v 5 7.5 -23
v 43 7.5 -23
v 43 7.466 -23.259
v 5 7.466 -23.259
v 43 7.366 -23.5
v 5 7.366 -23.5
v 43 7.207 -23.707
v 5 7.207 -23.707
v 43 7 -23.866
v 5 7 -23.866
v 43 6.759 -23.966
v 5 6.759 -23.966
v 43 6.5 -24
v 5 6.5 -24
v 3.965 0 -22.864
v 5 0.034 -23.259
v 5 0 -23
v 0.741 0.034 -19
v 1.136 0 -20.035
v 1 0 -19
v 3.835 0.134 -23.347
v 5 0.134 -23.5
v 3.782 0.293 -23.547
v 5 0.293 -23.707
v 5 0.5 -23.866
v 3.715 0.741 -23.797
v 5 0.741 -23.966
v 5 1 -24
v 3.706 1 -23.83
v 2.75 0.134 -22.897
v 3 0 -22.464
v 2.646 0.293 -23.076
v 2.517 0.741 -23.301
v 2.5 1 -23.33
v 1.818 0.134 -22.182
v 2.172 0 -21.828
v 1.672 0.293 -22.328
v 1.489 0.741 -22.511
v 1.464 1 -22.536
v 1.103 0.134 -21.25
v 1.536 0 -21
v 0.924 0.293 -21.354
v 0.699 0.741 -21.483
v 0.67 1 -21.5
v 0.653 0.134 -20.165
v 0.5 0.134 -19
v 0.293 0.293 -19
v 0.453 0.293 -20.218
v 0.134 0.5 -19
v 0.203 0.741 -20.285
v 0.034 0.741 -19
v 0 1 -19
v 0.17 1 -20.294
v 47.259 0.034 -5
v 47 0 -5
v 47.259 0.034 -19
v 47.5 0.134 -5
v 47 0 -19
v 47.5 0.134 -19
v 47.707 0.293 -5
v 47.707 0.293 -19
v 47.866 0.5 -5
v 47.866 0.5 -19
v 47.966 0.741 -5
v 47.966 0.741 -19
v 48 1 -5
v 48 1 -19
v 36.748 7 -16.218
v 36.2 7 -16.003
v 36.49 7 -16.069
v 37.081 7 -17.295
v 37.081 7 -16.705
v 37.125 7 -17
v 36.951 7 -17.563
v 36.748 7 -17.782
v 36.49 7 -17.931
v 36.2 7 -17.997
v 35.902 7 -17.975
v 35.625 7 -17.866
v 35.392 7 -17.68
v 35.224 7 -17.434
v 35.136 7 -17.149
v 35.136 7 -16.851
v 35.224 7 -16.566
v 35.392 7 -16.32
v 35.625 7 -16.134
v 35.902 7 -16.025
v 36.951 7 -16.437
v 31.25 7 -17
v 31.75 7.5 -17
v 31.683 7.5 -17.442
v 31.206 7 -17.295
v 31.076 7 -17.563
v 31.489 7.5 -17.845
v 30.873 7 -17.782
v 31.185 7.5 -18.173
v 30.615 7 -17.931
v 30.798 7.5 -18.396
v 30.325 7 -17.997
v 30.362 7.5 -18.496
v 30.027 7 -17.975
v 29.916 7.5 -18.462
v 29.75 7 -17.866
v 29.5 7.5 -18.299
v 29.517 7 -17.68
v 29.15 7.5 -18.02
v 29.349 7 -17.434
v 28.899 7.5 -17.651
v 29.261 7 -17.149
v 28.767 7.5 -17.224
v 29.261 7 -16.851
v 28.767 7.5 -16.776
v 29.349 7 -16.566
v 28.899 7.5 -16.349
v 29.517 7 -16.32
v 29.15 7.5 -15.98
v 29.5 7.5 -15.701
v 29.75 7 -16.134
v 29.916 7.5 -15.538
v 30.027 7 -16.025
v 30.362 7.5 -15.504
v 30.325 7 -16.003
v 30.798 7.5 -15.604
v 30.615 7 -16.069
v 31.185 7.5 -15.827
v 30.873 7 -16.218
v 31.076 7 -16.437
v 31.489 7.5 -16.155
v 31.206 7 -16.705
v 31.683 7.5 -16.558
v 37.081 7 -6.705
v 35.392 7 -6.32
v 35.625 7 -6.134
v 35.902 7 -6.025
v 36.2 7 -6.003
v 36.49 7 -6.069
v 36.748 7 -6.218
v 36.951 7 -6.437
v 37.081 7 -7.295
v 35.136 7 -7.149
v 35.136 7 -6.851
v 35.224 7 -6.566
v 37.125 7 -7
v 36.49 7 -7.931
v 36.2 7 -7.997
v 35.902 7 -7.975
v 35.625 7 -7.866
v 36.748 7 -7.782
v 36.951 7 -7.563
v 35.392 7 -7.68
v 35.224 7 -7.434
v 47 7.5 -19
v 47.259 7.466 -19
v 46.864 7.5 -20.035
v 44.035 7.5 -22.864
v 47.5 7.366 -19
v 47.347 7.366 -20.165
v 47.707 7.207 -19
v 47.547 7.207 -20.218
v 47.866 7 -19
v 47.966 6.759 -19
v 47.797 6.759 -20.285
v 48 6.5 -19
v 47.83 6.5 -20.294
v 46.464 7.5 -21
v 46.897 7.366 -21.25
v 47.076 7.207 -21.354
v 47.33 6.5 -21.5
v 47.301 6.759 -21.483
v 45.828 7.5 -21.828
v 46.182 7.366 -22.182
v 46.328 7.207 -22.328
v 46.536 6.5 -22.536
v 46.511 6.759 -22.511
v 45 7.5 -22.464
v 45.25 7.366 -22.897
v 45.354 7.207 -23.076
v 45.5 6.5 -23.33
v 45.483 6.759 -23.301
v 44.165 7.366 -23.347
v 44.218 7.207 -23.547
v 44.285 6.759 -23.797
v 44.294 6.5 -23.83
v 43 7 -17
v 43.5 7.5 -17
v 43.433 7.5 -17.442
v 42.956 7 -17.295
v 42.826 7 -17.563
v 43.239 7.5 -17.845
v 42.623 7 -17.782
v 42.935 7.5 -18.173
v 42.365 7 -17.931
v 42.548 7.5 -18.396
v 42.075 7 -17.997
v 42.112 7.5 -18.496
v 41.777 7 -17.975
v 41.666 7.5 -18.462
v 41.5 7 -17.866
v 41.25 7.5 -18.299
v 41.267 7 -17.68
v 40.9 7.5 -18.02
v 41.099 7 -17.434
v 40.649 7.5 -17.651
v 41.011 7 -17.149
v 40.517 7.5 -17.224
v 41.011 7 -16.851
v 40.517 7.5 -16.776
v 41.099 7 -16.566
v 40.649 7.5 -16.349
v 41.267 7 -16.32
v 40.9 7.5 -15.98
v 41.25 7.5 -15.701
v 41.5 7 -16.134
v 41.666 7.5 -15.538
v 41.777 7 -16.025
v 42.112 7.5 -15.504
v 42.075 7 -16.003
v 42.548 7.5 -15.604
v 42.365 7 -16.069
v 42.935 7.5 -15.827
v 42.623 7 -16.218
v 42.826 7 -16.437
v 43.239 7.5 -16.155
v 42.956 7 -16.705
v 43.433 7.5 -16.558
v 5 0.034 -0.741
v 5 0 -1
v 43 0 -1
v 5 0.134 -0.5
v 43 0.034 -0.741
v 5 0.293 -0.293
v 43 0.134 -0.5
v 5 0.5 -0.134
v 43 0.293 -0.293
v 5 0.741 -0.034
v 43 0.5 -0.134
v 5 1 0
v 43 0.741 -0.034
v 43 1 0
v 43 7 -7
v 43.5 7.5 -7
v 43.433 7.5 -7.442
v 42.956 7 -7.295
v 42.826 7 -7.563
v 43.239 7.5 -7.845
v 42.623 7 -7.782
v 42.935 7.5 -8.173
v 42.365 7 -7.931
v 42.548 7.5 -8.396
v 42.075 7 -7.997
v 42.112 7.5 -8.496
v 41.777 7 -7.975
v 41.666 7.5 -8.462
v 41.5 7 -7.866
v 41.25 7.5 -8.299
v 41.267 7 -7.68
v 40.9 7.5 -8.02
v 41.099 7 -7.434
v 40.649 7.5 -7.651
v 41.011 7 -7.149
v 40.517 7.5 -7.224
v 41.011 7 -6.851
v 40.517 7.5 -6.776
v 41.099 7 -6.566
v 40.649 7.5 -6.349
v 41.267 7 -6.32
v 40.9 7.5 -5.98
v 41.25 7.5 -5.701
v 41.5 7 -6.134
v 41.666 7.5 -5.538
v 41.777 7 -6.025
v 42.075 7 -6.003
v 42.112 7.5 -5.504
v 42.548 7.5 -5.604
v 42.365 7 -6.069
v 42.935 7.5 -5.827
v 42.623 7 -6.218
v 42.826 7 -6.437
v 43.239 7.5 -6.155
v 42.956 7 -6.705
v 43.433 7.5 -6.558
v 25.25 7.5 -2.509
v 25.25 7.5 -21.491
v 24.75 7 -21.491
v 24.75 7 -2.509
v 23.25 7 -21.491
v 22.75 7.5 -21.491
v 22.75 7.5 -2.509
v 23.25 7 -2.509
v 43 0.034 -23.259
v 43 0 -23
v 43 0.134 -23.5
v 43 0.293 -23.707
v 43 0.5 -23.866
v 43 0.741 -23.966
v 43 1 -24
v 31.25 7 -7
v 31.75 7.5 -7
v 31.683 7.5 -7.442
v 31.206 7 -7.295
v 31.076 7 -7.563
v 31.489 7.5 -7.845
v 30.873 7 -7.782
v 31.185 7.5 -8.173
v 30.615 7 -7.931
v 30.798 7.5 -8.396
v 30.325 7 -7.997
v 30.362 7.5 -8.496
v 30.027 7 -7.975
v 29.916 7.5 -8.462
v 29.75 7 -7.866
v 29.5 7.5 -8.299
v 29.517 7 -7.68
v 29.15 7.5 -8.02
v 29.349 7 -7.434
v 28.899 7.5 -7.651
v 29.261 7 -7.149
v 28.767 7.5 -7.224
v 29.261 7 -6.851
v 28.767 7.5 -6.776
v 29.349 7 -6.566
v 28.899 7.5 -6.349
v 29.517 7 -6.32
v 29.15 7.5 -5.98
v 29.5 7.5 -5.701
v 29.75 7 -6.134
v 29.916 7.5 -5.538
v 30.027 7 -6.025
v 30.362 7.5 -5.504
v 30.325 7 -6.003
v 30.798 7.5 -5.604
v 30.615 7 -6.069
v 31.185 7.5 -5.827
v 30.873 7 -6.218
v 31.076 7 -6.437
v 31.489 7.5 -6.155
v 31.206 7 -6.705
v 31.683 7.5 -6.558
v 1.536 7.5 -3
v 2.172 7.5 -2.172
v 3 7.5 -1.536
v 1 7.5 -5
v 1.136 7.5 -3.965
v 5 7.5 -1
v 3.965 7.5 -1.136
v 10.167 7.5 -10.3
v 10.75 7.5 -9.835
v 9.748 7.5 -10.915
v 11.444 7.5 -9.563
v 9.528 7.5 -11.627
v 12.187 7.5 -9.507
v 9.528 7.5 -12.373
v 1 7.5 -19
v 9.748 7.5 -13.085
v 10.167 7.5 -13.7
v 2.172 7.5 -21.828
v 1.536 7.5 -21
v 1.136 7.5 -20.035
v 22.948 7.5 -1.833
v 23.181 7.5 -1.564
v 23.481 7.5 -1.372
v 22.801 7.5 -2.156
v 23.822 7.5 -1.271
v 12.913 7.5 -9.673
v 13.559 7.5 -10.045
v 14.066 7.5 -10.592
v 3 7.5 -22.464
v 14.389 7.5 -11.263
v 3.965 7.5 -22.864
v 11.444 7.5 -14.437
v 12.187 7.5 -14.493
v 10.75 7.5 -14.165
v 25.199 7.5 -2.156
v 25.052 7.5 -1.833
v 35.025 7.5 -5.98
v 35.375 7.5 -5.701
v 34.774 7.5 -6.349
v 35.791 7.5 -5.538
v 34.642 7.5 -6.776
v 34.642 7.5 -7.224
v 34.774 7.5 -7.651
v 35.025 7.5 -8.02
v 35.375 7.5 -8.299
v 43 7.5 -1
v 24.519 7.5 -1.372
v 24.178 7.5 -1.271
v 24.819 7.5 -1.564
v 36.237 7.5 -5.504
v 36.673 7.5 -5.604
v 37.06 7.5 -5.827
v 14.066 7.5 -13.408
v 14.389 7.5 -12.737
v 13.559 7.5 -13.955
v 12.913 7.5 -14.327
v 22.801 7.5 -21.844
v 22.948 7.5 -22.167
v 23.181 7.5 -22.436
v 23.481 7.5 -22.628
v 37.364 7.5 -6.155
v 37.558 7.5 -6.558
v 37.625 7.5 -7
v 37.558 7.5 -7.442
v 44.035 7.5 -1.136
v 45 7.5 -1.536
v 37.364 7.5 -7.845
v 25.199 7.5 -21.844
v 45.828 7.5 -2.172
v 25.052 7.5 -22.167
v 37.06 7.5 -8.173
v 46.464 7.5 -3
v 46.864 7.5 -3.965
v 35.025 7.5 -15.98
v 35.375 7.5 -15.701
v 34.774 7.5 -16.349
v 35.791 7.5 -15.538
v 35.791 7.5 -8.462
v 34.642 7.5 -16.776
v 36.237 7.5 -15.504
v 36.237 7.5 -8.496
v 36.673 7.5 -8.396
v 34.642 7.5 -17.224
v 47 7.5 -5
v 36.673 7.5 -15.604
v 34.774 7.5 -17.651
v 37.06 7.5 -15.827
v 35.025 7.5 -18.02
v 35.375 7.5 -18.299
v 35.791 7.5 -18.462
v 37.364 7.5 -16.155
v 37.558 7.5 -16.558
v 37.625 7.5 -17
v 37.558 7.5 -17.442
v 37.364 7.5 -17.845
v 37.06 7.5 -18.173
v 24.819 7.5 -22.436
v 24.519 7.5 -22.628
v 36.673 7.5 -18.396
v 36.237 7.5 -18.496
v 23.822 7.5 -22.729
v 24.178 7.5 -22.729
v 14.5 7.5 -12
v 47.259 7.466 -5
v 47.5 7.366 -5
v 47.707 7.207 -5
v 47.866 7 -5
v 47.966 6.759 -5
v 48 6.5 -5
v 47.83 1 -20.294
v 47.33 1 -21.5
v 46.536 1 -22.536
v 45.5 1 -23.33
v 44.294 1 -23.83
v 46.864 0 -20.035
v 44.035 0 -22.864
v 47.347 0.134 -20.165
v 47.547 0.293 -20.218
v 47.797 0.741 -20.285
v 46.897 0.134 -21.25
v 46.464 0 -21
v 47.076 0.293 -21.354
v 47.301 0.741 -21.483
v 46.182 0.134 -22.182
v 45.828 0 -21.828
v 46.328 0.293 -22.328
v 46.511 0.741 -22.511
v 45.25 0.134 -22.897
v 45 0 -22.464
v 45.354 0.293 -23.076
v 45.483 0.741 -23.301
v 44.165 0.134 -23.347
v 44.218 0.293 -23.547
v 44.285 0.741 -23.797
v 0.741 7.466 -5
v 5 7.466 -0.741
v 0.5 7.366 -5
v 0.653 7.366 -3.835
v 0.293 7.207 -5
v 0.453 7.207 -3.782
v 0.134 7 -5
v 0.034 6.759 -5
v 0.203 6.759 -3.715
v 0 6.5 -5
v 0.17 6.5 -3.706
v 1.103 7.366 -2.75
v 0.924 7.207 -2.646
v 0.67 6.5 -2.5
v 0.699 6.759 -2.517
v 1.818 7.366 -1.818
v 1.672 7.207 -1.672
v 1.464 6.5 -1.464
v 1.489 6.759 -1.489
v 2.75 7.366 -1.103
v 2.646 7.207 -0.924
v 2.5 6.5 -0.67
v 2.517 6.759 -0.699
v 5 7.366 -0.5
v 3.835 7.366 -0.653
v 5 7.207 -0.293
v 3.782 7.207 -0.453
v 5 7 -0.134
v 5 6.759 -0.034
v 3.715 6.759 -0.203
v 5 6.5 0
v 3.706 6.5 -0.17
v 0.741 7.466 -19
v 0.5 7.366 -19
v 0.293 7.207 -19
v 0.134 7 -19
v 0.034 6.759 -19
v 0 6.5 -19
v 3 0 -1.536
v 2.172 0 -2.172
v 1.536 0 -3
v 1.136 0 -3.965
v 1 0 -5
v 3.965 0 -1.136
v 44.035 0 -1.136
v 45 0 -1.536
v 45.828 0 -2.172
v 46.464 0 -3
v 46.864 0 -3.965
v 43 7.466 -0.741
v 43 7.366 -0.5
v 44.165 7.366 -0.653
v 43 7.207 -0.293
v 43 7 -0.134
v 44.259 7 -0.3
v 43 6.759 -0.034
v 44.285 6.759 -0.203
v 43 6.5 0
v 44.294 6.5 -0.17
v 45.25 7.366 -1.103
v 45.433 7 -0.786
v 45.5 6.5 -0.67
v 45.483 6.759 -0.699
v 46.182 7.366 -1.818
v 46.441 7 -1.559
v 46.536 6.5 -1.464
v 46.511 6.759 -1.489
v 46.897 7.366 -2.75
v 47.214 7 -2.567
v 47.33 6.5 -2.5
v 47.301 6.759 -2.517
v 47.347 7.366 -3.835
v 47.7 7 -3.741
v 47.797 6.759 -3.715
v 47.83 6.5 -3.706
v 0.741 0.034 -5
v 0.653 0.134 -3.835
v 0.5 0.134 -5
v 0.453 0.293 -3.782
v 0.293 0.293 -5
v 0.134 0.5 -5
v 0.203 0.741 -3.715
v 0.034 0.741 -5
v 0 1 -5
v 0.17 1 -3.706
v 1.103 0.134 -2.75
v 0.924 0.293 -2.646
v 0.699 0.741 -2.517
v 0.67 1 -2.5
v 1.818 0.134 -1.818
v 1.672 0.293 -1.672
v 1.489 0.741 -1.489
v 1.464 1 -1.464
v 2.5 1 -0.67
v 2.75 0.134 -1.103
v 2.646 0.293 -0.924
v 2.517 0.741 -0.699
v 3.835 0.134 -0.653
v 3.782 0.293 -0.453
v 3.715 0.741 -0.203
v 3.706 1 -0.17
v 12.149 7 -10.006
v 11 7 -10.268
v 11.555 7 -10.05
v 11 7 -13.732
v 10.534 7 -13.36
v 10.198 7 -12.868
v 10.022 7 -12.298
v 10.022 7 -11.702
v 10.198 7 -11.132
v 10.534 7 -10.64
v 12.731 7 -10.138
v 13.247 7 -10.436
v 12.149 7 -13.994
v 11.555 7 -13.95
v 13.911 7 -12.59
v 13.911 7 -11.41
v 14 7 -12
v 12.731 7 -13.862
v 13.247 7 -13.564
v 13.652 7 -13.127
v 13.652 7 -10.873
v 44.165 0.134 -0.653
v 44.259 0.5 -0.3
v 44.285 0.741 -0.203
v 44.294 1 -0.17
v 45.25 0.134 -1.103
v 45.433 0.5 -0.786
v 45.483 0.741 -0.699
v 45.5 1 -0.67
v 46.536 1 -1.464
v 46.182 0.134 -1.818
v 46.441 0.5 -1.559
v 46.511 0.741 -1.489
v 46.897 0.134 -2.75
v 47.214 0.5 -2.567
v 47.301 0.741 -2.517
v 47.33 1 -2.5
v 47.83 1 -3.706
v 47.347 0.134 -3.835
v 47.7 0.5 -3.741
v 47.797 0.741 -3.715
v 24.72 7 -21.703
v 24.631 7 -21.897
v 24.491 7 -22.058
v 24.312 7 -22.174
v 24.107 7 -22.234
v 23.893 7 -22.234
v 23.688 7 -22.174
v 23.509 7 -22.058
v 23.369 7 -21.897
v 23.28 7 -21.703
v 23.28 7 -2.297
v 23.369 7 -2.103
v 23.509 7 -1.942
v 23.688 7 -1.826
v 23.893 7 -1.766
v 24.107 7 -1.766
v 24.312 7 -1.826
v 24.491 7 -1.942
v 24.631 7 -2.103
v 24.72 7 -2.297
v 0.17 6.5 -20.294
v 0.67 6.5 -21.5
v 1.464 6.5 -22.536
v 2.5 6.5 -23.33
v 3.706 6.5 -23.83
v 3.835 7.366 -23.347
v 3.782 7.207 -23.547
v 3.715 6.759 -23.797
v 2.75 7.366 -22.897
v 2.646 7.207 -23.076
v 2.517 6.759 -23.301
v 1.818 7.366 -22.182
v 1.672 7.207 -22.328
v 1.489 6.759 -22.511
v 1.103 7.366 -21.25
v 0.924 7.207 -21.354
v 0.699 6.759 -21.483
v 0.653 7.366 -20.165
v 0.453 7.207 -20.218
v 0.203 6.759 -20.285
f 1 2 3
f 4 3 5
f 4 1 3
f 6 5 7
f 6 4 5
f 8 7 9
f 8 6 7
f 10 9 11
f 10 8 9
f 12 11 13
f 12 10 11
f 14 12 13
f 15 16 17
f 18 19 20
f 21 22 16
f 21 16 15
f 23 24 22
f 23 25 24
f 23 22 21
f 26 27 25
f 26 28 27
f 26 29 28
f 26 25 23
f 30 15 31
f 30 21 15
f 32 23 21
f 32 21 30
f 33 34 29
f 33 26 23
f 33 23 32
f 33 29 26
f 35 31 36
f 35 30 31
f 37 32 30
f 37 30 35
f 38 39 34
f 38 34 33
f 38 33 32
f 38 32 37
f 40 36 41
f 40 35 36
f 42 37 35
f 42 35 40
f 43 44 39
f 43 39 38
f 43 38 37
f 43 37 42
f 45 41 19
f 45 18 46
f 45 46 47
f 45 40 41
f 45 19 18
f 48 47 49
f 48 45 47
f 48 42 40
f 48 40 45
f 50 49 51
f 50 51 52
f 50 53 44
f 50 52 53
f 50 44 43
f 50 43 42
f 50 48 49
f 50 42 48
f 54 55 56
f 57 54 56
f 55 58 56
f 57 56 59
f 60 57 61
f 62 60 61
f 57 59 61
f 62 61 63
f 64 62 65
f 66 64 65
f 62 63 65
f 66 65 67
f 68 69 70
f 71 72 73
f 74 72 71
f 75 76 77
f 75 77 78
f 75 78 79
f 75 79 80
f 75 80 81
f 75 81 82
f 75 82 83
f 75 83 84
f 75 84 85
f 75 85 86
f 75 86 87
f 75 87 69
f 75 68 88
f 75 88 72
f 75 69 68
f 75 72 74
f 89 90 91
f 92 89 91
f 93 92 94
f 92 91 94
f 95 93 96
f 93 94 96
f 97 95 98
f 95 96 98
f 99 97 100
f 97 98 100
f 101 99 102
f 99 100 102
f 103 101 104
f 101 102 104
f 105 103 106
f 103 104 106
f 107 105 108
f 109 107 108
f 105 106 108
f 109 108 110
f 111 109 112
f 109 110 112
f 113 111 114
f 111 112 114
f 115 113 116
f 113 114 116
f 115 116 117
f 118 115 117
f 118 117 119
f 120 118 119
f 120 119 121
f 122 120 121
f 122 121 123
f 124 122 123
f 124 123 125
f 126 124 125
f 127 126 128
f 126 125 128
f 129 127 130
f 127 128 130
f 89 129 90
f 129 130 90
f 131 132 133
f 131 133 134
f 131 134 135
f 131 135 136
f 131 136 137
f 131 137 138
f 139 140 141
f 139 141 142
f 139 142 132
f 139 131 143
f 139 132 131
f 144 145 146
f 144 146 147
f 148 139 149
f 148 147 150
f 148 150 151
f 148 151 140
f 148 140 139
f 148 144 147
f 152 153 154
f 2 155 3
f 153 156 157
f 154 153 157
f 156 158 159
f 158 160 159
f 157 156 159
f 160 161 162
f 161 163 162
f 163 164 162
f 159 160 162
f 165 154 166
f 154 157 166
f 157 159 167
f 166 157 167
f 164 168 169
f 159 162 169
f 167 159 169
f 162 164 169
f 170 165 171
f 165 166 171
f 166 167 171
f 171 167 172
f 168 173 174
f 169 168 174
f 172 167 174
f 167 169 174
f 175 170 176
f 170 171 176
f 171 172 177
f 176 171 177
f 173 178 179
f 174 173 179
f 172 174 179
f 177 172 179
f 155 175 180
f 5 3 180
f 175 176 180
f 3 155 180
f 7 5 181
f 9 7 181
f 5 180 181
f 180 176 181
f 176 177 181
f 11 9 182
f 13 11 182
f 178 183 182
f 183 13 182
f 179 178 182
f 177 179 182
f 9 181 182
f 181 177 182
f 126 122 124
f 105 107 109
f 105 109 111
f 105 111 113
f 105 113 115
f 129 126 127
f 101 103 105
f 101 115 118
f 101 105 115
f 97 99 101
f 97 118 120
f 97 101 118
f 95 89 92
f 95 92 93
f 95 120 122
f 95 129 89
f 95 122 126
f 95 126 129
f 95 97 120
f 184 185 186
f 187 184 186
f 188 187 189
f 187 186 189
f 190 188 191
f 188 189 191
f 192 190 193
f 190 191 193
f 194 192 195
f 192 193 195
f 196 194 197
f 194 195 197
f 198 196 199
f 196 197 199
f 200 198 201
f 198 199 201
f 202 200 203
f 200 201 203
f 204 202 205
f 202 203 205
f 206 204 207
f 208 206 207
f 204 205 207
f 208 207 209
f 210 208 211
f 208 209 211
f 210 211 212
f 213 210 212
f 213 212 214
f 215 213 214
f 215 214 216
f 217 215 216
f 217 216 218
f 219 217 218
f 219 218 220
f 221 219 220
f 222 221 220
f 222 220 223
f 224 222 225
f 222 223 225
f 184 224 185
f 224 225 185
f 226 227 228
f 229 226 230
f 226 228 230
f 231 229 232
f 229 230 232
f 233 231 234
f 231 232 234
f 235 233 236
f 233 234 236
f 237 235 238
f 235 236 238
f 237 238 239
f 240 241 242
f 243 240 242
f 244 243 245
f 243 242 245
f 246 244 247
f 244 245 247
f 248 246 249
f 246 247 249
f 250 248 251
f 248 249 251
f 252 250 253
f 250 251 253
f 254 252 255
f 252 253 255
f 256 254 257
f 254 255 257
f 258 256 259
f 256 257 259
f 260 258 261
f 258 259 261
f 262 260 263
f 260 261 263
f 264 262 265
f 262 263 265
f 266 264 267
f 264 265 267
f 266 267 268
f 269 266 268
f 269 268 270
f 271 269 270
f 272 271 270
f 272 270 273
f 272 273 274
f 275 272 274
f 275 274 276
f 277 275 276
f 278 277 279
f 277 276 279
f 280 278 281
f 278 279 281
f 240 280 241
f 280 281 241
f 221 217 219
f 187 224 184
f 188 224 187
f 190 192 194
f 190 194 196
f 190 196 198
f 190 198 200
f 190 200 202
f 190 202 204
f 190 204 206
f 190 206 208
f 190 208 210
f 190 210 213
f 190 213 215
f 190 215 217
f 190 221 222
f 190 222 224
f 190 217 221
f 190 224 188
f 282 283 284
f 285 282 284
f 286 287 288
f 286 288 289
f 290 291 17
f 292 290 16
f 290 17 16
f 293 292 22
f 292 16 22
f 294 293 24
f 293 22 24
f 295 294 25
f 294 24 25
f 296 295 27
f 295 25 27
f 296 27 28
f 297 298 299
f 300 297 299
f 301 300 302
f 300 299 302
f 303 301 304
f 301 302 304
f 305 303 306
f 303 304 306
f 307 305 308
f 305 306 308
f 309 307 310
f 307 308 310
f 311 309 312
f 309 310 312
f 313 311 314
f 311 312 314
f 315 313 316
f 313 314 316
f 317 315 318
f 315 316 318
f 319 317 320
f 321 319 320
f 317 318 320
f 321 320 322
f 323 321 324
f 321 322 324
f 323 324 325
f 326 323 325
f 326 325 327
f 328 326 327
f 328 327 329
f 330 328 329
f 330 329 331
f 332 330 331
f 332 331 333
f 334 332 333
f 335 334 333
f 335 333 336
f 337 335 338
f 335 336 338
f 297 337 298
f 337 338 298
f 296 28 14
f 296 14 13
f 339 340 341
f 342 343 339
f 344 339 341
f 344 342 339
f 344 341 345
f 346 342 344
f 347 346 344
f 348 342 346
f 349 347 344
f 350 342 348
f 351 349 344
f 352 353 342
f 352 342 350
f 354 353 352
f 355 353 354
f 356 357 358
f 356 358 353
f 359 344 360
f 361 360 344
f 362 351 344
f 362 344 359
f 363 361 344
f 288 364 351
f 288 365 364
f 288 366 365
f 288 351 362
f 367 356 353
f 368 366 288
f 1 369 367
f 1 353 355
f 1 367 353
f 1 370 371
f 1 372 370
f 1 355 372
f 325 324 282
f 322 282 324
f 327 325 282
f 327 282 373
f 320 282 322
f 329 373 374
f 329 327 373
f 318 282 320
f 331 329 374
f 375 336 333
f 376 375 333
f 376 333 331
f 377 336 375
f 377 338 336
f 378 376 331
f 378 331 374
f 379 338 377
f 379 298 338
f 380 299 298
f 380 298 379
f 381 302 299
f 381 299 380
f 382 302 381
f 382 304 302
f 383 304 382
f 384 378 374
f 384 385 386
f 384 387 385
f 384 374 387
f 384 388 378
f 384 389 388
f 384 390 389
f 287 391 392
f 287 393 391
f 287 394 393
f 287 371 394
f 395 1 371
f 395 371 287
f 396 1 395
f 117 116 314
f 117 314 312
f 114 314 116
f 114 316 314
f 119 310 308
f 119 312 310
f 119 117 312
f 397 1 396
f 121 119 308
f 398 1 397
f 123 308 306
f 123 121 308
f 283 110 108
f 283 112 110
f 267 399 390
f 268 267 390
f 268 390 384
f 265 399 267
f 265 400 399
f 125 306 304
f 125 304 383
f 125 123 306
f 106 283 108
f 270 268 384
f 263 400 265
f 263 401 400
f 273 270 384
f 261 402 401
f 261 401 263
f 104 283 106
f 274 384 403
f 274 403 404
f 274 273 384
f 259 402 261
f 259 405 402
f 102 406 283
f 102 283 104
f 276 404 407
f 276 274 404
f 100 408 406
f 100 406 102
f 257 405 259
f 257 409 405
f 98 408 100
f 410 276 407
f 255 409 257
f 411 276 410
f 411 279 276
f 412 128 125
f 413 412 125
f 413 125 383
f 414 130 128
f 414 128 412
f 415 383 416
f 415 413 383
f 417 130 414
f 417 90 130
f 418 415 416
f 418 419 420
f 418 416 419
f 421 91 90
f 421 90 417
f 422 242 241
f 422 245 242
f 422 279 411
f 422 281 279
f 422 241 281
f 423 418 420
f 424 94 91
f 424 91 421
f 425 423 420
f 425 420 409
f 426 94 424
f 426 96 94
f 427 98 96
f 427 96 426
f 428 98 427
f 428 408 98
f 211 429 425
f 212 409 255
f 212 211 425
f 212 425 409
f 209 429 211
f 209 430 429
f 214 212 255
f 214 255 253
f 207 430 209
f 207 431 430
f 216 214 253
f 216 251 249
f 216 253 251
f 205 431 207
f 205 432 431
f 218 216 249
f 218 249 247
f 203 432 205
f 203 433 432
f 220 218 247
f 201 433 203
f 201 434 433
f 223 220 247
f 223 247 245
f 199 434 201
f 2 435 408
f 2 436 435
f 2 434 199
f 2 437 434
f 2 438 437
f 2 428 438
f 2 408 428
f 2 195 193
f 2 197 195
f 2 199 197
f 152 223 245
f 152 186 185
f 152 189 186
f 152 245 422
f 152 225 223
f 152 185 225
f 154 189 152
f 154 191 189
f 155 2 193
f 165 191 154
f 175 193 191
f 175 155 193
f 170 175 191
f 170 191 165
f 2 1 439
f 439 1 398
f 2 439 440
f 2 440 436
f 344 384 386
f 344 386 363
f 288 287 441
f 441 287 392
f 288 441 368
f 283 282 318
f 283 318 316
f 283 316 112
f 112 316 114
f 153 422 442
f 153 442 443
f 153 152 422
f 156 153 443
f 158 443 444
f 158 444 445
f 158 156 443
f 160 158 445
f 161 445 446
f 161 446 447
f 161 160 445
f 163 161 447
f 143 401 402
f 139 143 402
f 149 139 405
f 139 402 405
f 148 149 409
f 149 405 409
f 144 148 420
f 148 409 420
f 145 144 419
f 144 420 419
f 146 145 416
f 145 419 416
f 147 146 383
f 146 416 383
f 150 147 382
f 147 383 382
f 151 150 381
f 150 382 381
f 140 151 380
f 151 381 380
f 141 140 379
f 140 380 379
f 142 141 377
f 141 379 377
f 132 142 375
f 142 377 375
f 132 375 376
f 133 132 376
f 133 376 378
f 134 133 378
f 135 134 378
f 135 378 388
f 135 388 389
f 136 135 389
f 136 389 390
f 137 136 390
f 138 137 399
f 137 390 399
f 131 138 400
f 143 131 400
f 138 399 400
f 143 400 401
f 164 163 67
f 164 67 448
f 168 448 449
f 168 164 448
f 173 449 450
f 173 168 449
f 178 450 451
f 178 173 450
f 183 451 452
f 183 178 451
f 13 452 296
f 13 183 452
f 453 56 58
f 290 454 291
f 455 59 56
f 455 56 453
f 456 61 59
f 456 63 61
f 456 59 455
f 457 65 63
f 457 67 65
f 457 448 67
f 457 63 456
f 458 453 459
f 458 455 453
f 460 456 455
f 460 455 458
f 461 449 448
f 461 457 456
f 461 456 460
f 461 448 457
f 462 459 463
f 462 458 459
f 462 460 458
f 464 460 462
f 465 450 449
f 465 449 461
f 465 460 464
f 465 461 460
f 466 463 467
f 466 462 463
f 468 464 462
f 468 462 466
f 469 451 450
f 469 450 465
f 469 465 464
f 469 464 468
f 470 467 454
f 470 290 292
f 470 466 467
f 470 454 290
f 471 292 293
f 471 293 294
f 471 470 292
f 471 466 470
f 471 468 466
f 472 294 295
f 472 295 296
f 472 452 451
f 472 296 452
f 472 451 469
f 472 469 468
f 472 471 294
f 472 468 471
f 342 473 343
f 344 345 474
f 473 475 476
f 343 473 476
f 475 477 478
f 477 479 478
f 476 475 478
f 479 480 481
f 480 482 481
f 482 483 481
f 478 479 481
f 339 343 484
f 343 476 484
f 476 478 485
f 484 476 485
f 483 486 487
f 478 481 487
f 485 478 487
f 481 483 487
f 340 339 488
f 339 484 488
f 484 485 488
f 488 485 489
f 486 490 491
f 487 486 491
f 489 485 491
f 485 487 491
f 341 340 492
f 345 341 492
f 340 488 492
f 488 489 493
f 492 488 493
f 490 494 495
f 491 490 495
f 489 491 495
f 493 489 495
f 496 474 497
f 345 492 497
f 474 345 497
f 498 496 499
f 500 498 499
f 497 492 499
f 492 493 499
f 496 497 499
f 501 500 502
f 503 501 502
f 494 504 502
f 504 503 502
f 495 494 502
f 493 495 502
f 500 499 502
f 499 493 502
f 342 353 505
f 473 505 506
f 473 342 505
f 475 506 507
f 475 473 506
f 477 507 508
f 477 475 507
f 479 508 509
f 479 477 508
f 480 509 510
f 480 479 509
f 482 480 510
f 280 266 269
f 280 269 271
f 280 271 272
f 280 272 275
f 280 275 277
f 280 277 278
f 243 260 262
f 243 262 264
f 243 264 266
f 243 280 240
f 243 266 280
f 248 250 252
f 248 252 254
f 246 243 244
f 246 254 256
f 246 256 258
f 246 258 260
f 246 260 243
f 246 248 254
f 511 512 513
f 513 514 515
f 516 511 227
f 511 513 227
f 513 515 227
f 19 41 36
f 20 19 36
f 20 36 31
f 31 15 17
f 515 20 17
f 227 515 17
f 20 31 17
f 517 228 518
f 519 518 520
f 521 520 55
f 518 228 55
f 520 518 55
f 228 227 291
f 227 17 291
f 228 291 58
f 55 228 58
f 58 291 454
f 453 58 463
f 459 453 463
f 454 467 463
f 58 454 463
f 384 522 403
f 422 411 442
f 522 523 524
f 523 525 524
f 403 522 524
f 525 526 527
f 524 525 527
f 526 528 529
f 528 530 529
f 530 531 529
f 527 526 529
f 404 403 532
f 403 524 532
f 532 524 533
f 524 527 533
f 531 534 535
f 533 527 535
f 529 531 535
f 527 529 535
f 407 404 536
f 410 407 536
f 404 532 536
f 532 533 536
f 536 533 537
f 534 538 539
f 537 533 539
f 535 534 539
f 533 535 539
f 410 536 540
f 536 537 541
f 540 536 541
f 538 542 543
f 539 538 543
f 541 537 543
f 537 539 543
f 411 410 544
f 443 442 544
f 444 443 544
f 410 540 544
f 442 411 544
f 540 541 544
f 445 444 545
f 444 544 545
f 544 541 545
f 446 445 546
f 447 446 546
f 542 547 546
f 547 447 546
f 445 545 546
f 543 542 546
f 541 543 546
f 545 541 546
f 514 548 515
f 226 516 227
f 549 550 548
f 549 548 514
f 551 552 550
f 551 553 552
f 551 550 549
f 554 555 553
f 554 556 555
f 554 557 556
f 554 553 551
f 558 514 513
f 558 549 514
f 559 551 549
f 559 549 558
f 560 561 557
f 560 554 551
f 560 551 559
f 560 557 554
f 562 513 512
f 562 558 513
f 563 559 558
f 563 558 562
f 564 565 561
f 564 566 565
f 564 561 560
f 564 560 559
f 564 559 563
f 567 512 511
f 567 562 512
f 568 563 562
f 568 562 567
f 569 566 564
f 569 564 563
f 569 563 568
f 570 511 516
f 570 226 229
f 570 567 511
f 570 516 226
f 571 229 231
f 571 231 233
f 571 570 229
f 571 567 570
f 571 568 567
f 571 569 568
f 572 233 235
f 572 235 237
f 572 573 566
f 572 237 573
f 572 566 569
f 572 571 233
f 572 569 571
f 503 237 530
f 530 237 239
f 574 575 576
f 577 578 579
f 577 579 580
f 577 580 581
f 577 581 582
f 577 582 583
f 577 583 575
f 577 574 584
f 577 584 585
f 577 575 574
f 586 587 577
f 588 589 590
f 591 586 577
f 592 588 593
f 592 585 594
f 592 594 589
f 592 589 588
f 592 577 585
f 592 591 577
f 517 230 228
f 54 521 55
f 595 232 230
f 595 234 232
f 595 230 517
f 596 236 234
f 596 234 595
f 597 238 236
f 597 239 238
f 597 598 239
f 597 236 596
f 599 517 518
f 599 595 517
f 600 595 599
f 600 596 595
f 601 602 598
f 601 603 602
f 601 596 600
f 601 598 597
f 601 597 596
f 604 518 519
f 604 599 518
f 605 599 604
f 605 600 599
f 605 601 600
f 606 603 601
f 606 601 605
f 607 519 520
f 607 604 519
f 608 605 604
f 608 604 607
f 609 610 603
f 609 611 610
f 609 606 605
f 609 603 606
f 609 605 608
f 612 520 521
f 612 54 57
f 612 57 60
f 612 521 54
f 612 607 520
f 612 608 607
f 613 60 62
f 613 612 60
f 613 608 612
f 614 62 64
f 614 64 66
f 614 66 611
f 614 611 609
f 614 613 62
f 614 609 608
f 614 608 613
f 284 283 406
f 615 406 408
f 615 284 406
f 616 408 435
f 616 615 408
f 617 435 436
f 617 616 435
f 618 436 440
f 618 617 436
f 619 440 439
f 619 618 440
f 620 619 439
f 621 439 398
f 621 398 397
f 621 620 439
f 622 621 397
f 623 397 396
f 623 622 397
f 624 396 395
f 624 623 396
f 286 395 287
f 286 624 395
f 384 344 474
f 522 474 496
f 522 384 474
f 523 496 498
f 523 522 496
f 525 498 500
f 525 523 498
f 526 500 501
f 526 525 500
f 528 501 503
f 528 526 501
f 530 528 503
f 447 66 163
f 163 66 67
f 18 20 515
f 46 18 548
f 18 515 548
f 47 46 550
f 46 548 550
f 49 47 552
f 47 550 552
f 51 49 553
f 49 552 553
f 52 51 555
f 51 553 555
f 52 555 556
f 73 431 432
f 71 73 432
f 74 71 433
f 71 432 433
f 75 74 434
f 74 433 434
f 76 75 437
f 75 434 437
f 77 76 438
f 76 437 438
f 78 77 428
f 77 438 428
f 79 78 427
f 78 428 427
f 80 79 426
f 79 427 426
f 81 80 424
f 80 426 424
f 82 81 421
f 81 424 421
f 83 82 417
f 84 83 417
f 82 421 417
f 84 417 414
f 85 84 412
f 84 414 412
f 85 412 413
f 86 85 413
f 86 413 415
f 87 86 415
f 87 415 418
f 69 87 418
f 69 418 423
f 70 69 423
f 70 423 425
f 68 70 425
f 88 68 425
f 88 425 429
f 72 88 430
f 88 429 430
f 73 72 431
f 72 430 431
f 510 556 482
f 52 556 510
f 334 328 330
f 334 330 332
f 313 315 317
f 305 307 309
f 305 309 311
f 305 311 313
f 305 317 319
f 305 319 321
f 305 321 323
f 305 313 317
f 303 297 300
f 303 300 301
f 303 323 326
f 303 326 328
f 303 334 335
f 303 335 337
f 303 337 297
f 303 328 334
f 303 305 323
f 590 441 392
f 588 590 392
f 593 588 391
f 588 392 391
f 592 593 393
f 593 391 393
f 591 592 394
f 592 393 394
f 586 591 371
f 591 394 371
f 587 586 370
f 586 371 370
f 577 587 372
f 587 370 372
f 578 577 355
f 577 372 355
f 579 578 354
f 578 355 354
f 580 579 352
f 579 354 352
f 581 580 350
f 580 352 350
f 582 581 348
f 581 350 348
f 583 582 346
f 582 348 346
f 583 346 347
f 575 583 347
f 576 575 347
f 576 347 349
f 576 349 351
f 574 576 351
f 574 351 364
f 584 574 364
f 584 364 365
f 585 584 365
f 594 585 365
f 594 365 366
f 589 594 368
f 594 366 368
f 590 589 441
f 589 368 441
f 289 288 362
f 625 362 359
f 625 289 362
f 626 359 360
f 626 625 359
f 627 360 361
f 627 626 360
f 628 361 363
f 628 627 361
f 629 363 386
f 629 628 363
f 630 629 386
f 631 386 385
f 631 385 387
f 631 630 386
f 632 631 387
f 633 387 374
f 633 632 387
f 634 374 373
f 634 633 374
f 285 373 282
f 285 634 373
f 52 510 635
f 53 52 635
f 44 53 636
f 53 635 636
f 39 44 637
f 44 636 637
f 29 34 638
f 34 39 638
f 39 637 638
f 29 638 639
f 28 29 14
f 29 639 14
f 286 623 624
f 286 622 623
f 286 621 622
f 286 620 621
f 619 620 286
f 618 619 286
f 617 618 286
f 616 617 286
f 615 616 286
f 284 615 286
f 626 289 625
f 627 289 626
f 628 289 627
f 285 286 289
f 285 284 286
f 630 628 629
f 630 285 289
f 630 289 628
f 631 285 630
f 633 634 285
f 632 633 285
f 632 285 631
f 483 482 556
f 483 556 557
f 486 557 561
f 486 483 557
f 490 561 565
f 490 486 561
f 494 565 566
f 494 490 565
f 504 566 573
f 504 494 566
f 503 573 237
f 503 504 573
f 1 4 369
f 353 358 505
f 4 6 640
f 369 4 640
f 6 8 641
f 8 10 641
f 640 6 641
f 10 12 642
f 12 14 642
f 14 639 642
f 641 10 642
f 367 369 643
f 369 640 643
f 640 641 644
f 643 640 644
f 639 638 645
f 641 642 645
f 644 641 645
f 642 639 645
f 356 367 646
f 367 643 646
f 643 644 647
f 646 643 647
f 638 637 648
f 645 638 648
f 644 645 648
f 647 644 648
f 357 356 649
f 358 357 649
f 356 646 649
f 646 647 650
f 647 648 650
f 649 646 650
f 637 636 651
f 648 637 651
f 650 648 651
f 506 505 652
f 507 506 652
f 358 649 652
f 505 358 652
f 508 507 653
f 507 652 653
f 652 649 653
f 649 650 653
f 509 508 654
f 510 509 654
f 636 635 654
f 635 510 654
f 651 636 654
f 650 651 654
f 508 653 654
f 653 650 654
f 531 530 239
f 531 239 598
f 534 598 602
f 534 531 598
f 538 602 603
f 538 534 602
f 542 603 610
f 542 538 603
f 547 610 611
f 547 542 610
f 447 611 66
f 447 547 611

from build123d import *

# Parameters (mm, degrees)
ESQUISSE1_W                = 48
ESQUISSE1_H                = 24
EXTRUSION1_DEPTH           = 7.5
CONG_2_R                   = 5
CONG_5_R                   = 1
CONG_6_R                   = 1
ESQUISSE4_W                = 0.5
ESQUISSE4_H                = 18.982849842
EXTRUSION2_DEPTH           = 0.5
ESQUISSE5_R                = 0.25
EXTRUSION3_DEPTH           = 0.5
CHANFREIN1_SIZE            = 1
ESQUISSE10_R               = 2.5
EXTRUSION8_DEPTH           = 0.5
EXTRUSION8_DRAFT           = -45
ESQUISSE12_R               = 1.5
EXTRUSION9_DEPTH           = 0.5
EXTRUSION9_DRAFT           = -45
EXTRUSION9_PROFILE_2_DEPTH = 0.5
EXTRUSION9_PROFILE_2_DRAFT = -45
EXTRUSION9_PROFILE_3_DEPTH = 0.5
EXTRUSION9_PROFILE_3_DRAFT = -45
EXTRUSION9_PROFILE_4_DEPTH = 0.5
EXTRUSION9_PROFILE_4_DRAFT = -45
EXTRUSION9_PROFILE_5_DEPTH = 0.5
EXTRUSION9_PROFILE_5_DRAFT = -45
EXTRUSION9_PROFILE_6_DEPTH = 0.5
EXTRUSION9_PROFILE_6_DRAFT = -45


with BuildPart() as part:
    # Esquisse1 → Extrusion1 (new body)
    with BuildSketch(Plane(origin=(0, 0, 0), x_dir=(1, 0, 0), z_dir=(0, 1, 0))):
        with Locations((24, 12)):
            Rectangle(ESQUISSE1_W, ESQUISSE1_H)
    extrude(amount=EXTRUSION1_DEPTH)

    # Congé2
    cong_2_edges = [part.edges().sort_by_distance(p)[0] for p in [
        (0, 3.75, -24),
        (48, 3.75, -24),
        (48, 3.75, 0),
        (0, 3.75, 0),
    ]]
    fillet(cong_2_edges, radius=CONG_2_R)

    # Congé5
    cong_5_edges = [part.edges().sort_by_distance(p)[0] for p in [
        (48, 7.5, -12),
        (24, 7.5, 0),
        (0, 7.5, -12),
        (24, 7.5, -24),
        (1.464466094, 7.5, -22.535533906),
        (1.464466094, 7.5, -1.464466094),
        (46.535533906, 7.5, -22.535533906),
        (46.535533906, 7.5, -1.464466094),
    ]]
    fillet(cong_5_edges, radius=CONG_5_R)

    # Congé6
    cong_6_edges = [part.edges().sort_by_distance(p)[0] for p in [
        (48, 0, -12),
        (0, 0, -12),
        (24, 0, -24),
        (24, 0, 0),
        (1.464466094, 0, -22.535533906),
        (1.464466094, 0, -1.464466094),
        (46.535533906, 0, -22.535533906),
        (46.535533906, 0, -1.464466094),
    ]]
    fillet(cong_6_edges, radius=CONG_6_R)

    # Esquisse4 → Extrusion2 (cut)
    with BuildSketch(Plane(origin=(0, 7.5, 0), x_dir=(1, 0, 0), z_dir=(0, 1, 0))):
        with Locations((24, 12)):
            Rectangle(ESQUISSE4_W, ESQUISSE4_H)
    extrude(amount=-EXTRUSION2_DEPTH, mode=Mode.SUBTRACT)

    # Esquisse5 → Extrusion3 (cut)
    with BuildSketch(Plane(origin=(0, 7.5, 0), x_dir=(1, 0, 0), z_dir=(0, 1, 0))):
        with Locations((24, 21.491424921)):
            Circle(ESQUISSE5_R)
        with Locations((24, 2.508575079)):
            Circle(ESQUISSE5_R)
    extrude(amount=-EXTRUSION3_DEPTH, mode=Mode.SUBTRACT)

    # Chanfrein1
    # the kernel refuses this chamfer: 1 mm, written as the material it takes off along each edge
    with BuildSketch(Plane(origin=(24, 7.5, -21.491424921), x_dir=(1, 0, 0), z_dir=(0, 0, 1))) as chanfrein1_piece_1_section:
        Polygon((0.25 + CHANFREIN1_SIZE, 0), (0.25, -CHANFREIN1_SIZE), (0.25, 0), align=None)
    chanfrein1_piece_1 = revolve(axis=Axis((24, 7.5, -21.491424921), (0, 1, 0)), revolution_arc=180, mode=Mode.PRIVATE)
    chanfrein1_piece_1 = split(chanfrein1_piece_1, bisect_by=Plane(origin=(24, 7, -21.964580549), z_dir=(0, 1, 0)), keep=Keep.TOP, mode=Mode.PRIVATE)
    add(chanfrein1_piece_1, mode=Mode.SUBTRACT)
    with BuildSketch(Plane(origin=(24.25, 7.5, -21.491424921), x_dir=(0.9996219169112968, 0.02749587661058651, 0), z_dir=(0, 0, 1))) as chanfrein1_piece_2_section:
        Polygon((CHANFREIN1_SIZE * 0.999621916911, -CHANFREIN1_SIZE * 0.0274958766106), (-CHANFREIN1_SIZE * 0.0274958766106, -CHANFREIN1_SIZE * 0.999621916911), (0, 0), align=None)
    chanfrein1_piece_2 = extrude(amount=18.982849842, mode=Mode.PRIVATE)
    chanfrein1_piece_2 = split(chanfrein1_piece_2, bisect_by=Plane(origin=(24.643401084, 7, -12), z_dir=(0, 1, 0)), keep=Keep.TOP, mode=Mode.PRIVATE)
    add(chanfrein1_piece_2, mode=Mode.SUBTRACT)
    with BuildSketch(Plane(origin=(24, 7.5, -2.508575079), x_dir=(-1, 0, 0), z_dir=(0, 0, -1))) as chanfrein1_piece_3_section:
        Polygon((0.25 + CHANFREIN1_SIZE, 0), (0.25, -CHANFREIN1_SIZE), (0.25, 0), align=None)
    chanfrein1_piece_3 = revolve(axis=Axis((24, 7.5, -2.508575079), (0, 1, 0)), revolution_arc=180, mode=Mode.PRIVATE)
    chanfrein1_piece_3 = split(chanfrein1_piece_3, bisect_by=Plane(origin=(24, 7, -2.035419451), z_dir=(0, 1, 0)), keep=Keep.TOP, mode=Mode.PRIVATE)
    add(chanfrein1_piece_3, mode=Mode.SUBTRACT)
    with BuildSketch(Plane(origin=(23.75, 7.5, -2.508575079), x_dir=(-0.9996219169112968, 0.02749587661058651, 0), z_dir=(0, 0, -1))) as chanfrein1_piece_4_section:
        Polygon((CHANFREIN1_SIZE * 0.999621916911, -CHANFREIN1_SIZE * 0.0274958766106), (-CHANFREIN1_SIZE * 0.0274958766106, -CHANFREIN1_SIZE * 0.999621916911), (0, 0), align=None)
    chanfrein1_piece_4 = extrude(amount=18.982849842, mode=Mode.PRIVATE)
    chanfrein1_piece_4 = split(chanfrein1_piece_4, bisect_by=Plane(origin=(23.356598916, 7, -12), z_dir=(0, 1, 0)), keep=Keep.TOP, mode=Mode.PRIVATE)
    add(chanfrein1_piece_4, mode=Mode.SUBTRACT)


with BuildPart() as extrusion8_tool:
    # Esquisse10 → Extrusion8 (with draft: the straight prism first)
    with BuildSketch(Plane(origin=(0, 7.5, 0), x_dir=(1, 0, 0), z_dir=(0, 1, 0))):
        with Locations((12, 12)):
            Circle(ESQUISSE10_R)
    extrude(amount=-EXTRUSION8_DEPTH)
    # Extrusion8: the draft: its side faces are tilted about the plane it starts from
    extrusion8_sides = [extrusion8_tool.faces().sort_by_distance(p)[0] for p in [
        (9.5, 7.25, -12),
    ]]
    draft(extrusion8_sides, Plane(origin=(0, 7.5, 0), x_dir=(1, 0, 0), z_dir=(0, 1, 0)), EXTRUSION8_DRAFT)


with BuildPart() as part_1:
    add(part.part)

    # Extrusion8: cut by extrusion8_tool
    add(extrusion8_tool.part, mode=Mode.SUBTRACT)


with BuildPart() as extrusion9_tool:
    # Esquisse12 → Extrusion9 (with draft: the straight prism first)
    with BuildSketch(Plane(origin=(0, 7.5, 0), x_dir=(1, 0, 0), z_dir=(0, 1, 0))):
        with Locations((30.25, 17)):
            Circle(ESQUISSE12_R)
    extrude(amount=-EXTRUSION9_DEPTH)
    # Extrusion9: the draft: its side faces are tilted about the plane it starts from
    extrusion9_sides = [extrusion9_tool.faces().sort_by_distance(p)[0] for p in [
        (28.75, 7.25, -17),
    ]]
    draft(extrusion9_sides, Plane(origin=(0, 7.5, 0), x_dir=(1, 0, 0), z_dir=(0, 1, 0)), EXTRUSION9_DRAFT)


with BuildPart() as part_2:
    add(part_1.part)

    # Extrusion9: cut by extrusion9_tool
    add(extrusion9_tool.part, mode=Mode.SUBTRACT)


with BuildPart() as extrusion9_profile_2_tool:
    # Esquisse12 → Extrusion9 profile 2 (with draft: the straight prism first)
    with BuildSketch(Plane(origin=(0, 7.5, 0), x_dir=(1, 0, 0), z_dir=(0, 1, 0))):
        with Locations((36.125, 17)):
            Circle(ESQUISSE12_R)
    extrude(amount=-EXTRUSION9_PROFILE_2_DEPTH)
    # Extrusion9 profile 2: the draft: its side faces are tilted about the plane it starts from
    extrusion9_profile_2_sides = [extrusion9_profile_2_tool.faces().sort_by_distance(p)[0] for p in [
        (34.625, 7.25, -17),
    ]]
    draft(extrusion9_profile_2_sides, Plane(origin=(0, 7.5, 0), x_dir=(1, 0, 0), z_dir=(0, 1, 0)), EXTRUSION9_PROFILE_2_DRAFT)


with BuildPart() as part_3:
    add(part_2.part)

    # Extrusion9 profile 2: cut by extrusion9_profile_2_tool
    add(extrusion9_profile_2_tool.part, mode=Mode.SUBTRACT)


with BuildPart() as extrusion9_profile_3_tool:
    # Esquisse12 → Extrusion9 profile 3 (with draft: the straight prism first)
    with BuildSketch(Plane(origin=(0, 7.5, 0), x_dir=(1, 0, 0), z_dir=(0, 1, 0))):
        with Locations((42, 17)):
            Circle(ESQUISSE12_R)
    extrude(amount=-EXTRUSION9_PROFILE_3_DEPTH)
    # Extrusion9 profile 3: the draft: its side faces are tilted about the plane it starts from
    extrusion9_profile_3_sides = [extrusion9_profile_3_tool.faces().sort_by_distance(p)[0] for p in [
        (40.5, 7.25, -17),
    ]]
    draft(extrusion9_profile_3_sides, Plane(origin=(0, 7.5, 0), x_dir=(1, 0, 0), z_dir=(0, 1, 0)), EXTRUSION9_PROFILE_3_DRAFT)


with BuildPart() as part_4:
    add(part_3.part)

    # Extrusion9 profile 3: cut by extrusion9_profile_3_tool
    add(extrusion9_profile_3_tool.part, mode=Mode.SUBTRACT)


with BuildPart() as extrusion9_profile_4_tool:
    # Esquisse12 → Extrusion9 profile 4 (with draft: the straight prism first)
    with BuildSketch(Plane(origin=(0, 7.5, 0), x_dir=(1, 0, 0), z_dir=(0, 1, 0))):
        with Locations((30.25, 7)):
            Circle(ESQUISSE12_R)
    extrude(amount=-EXTRUSION9_PROFILE_4_DEPTH)
    # Extrusion9 profile 4: the draft: its side faces are tilted about the plane it starts from
    extrusion9_profile_4_sides = [extrusion9_profile_4_tool.faces().sort_by_distance(p)[0] for p in [
        (28.75, 7.25, -7),
    ]]
    draft(extrusion9_profile_4_sides, Plane(origin=(0, 7.5, 0), x_dir=(1, 0, 0), z_dir=(0, 1, 0)), EXTRUSION9_PROFILE_4_DRAFT)


with BuildPart() as part_5:
    add(part_4.part)

    # Extrusion9 profile 4: cut by extrusion9_profile_4_tool
    add(extrusion9_profile_4_tool.part, mode=Mode.SUBTRACT)


with BuildPart() as extrusion9_profile_5_tool:
    # Esquisse12 → Extrusion9 profile 5 (with draft: the straight prism first)
    with BuildSketch(Plane(origin=(0, 7.5, 0), x_dir=(1, 0, 0), z_dir=(0, 1, 0))):
        with Locations((36.125, 7)):
            Circle(ESQUISSE12_R)
    extrude(amount=-EXTRUSION9_PROFILE_5_DEPTH)
    # Extrusion9 profile 5: the draft: its side faces are tilted about the plane it starts from
    extrusion9_profile_5_sides = [extrusion9_profile_5_tool.faces().sort_by_distance(p)[0] for p in [
        (34.625, 7.25, -7),
    ]]
    draft(extrusion9_profile_5_sides, Plane(origin=(0, 7.5, 0), x_dir=(1, 0, 0), z_dir=(0, 1, 0)), EXTRUSION9_PROFILE_5_DRAFT)


with BuildPart() as part_6:
    add(part_5.part)

    # Extrusion9 profile 5: cut by extrusion9_profile_5_tool
    add(extrusion9_profile_5_tool.part, mode=Mode.SUBTRACT)


with BuildPart() as extrusion9_profile_6_tool:
    # Esquisse12 → Extrusion9 profile 6 (with draft: the straight prism first)
    with BuildSketch(Plane(origin=(0, 7.5, 0), x_dir=(1, 0, 0), z_dir=(0, 1, 0))):
        with Locations((42, 7)):
            Circle(ESQUISSE12_R)
    extrude(amount=-EXTRUSION9_PROFILE_6_DEPTH)
    # Extrusion9 profile 6: the draft: its side faces are tilted about the plane it starts from
    extrusion9_profile_6_sides = [extrusion9_profile_6_tool.faces().sort_by_distance(p)[0] for p in [
        (40.5, 7.25, -7),
    ]]
    draft(extrusion9_profile_6_sides, Plane(origin=(0, 7.5, 0), x_dir=(1, 0, 0), z_dir=(0, 1, 0)), EXTRUSION9_PROFILE_6_DRAFT)


with BuildPart() as part_7:
    add(part_6.part)

    # Extrusion9 profile 6: cut by extrusion9_profile_6_tool
    add(extrusion9_profile_6_tool.part, mode=Mode.SUBTRACT)


solid = part_7.part
